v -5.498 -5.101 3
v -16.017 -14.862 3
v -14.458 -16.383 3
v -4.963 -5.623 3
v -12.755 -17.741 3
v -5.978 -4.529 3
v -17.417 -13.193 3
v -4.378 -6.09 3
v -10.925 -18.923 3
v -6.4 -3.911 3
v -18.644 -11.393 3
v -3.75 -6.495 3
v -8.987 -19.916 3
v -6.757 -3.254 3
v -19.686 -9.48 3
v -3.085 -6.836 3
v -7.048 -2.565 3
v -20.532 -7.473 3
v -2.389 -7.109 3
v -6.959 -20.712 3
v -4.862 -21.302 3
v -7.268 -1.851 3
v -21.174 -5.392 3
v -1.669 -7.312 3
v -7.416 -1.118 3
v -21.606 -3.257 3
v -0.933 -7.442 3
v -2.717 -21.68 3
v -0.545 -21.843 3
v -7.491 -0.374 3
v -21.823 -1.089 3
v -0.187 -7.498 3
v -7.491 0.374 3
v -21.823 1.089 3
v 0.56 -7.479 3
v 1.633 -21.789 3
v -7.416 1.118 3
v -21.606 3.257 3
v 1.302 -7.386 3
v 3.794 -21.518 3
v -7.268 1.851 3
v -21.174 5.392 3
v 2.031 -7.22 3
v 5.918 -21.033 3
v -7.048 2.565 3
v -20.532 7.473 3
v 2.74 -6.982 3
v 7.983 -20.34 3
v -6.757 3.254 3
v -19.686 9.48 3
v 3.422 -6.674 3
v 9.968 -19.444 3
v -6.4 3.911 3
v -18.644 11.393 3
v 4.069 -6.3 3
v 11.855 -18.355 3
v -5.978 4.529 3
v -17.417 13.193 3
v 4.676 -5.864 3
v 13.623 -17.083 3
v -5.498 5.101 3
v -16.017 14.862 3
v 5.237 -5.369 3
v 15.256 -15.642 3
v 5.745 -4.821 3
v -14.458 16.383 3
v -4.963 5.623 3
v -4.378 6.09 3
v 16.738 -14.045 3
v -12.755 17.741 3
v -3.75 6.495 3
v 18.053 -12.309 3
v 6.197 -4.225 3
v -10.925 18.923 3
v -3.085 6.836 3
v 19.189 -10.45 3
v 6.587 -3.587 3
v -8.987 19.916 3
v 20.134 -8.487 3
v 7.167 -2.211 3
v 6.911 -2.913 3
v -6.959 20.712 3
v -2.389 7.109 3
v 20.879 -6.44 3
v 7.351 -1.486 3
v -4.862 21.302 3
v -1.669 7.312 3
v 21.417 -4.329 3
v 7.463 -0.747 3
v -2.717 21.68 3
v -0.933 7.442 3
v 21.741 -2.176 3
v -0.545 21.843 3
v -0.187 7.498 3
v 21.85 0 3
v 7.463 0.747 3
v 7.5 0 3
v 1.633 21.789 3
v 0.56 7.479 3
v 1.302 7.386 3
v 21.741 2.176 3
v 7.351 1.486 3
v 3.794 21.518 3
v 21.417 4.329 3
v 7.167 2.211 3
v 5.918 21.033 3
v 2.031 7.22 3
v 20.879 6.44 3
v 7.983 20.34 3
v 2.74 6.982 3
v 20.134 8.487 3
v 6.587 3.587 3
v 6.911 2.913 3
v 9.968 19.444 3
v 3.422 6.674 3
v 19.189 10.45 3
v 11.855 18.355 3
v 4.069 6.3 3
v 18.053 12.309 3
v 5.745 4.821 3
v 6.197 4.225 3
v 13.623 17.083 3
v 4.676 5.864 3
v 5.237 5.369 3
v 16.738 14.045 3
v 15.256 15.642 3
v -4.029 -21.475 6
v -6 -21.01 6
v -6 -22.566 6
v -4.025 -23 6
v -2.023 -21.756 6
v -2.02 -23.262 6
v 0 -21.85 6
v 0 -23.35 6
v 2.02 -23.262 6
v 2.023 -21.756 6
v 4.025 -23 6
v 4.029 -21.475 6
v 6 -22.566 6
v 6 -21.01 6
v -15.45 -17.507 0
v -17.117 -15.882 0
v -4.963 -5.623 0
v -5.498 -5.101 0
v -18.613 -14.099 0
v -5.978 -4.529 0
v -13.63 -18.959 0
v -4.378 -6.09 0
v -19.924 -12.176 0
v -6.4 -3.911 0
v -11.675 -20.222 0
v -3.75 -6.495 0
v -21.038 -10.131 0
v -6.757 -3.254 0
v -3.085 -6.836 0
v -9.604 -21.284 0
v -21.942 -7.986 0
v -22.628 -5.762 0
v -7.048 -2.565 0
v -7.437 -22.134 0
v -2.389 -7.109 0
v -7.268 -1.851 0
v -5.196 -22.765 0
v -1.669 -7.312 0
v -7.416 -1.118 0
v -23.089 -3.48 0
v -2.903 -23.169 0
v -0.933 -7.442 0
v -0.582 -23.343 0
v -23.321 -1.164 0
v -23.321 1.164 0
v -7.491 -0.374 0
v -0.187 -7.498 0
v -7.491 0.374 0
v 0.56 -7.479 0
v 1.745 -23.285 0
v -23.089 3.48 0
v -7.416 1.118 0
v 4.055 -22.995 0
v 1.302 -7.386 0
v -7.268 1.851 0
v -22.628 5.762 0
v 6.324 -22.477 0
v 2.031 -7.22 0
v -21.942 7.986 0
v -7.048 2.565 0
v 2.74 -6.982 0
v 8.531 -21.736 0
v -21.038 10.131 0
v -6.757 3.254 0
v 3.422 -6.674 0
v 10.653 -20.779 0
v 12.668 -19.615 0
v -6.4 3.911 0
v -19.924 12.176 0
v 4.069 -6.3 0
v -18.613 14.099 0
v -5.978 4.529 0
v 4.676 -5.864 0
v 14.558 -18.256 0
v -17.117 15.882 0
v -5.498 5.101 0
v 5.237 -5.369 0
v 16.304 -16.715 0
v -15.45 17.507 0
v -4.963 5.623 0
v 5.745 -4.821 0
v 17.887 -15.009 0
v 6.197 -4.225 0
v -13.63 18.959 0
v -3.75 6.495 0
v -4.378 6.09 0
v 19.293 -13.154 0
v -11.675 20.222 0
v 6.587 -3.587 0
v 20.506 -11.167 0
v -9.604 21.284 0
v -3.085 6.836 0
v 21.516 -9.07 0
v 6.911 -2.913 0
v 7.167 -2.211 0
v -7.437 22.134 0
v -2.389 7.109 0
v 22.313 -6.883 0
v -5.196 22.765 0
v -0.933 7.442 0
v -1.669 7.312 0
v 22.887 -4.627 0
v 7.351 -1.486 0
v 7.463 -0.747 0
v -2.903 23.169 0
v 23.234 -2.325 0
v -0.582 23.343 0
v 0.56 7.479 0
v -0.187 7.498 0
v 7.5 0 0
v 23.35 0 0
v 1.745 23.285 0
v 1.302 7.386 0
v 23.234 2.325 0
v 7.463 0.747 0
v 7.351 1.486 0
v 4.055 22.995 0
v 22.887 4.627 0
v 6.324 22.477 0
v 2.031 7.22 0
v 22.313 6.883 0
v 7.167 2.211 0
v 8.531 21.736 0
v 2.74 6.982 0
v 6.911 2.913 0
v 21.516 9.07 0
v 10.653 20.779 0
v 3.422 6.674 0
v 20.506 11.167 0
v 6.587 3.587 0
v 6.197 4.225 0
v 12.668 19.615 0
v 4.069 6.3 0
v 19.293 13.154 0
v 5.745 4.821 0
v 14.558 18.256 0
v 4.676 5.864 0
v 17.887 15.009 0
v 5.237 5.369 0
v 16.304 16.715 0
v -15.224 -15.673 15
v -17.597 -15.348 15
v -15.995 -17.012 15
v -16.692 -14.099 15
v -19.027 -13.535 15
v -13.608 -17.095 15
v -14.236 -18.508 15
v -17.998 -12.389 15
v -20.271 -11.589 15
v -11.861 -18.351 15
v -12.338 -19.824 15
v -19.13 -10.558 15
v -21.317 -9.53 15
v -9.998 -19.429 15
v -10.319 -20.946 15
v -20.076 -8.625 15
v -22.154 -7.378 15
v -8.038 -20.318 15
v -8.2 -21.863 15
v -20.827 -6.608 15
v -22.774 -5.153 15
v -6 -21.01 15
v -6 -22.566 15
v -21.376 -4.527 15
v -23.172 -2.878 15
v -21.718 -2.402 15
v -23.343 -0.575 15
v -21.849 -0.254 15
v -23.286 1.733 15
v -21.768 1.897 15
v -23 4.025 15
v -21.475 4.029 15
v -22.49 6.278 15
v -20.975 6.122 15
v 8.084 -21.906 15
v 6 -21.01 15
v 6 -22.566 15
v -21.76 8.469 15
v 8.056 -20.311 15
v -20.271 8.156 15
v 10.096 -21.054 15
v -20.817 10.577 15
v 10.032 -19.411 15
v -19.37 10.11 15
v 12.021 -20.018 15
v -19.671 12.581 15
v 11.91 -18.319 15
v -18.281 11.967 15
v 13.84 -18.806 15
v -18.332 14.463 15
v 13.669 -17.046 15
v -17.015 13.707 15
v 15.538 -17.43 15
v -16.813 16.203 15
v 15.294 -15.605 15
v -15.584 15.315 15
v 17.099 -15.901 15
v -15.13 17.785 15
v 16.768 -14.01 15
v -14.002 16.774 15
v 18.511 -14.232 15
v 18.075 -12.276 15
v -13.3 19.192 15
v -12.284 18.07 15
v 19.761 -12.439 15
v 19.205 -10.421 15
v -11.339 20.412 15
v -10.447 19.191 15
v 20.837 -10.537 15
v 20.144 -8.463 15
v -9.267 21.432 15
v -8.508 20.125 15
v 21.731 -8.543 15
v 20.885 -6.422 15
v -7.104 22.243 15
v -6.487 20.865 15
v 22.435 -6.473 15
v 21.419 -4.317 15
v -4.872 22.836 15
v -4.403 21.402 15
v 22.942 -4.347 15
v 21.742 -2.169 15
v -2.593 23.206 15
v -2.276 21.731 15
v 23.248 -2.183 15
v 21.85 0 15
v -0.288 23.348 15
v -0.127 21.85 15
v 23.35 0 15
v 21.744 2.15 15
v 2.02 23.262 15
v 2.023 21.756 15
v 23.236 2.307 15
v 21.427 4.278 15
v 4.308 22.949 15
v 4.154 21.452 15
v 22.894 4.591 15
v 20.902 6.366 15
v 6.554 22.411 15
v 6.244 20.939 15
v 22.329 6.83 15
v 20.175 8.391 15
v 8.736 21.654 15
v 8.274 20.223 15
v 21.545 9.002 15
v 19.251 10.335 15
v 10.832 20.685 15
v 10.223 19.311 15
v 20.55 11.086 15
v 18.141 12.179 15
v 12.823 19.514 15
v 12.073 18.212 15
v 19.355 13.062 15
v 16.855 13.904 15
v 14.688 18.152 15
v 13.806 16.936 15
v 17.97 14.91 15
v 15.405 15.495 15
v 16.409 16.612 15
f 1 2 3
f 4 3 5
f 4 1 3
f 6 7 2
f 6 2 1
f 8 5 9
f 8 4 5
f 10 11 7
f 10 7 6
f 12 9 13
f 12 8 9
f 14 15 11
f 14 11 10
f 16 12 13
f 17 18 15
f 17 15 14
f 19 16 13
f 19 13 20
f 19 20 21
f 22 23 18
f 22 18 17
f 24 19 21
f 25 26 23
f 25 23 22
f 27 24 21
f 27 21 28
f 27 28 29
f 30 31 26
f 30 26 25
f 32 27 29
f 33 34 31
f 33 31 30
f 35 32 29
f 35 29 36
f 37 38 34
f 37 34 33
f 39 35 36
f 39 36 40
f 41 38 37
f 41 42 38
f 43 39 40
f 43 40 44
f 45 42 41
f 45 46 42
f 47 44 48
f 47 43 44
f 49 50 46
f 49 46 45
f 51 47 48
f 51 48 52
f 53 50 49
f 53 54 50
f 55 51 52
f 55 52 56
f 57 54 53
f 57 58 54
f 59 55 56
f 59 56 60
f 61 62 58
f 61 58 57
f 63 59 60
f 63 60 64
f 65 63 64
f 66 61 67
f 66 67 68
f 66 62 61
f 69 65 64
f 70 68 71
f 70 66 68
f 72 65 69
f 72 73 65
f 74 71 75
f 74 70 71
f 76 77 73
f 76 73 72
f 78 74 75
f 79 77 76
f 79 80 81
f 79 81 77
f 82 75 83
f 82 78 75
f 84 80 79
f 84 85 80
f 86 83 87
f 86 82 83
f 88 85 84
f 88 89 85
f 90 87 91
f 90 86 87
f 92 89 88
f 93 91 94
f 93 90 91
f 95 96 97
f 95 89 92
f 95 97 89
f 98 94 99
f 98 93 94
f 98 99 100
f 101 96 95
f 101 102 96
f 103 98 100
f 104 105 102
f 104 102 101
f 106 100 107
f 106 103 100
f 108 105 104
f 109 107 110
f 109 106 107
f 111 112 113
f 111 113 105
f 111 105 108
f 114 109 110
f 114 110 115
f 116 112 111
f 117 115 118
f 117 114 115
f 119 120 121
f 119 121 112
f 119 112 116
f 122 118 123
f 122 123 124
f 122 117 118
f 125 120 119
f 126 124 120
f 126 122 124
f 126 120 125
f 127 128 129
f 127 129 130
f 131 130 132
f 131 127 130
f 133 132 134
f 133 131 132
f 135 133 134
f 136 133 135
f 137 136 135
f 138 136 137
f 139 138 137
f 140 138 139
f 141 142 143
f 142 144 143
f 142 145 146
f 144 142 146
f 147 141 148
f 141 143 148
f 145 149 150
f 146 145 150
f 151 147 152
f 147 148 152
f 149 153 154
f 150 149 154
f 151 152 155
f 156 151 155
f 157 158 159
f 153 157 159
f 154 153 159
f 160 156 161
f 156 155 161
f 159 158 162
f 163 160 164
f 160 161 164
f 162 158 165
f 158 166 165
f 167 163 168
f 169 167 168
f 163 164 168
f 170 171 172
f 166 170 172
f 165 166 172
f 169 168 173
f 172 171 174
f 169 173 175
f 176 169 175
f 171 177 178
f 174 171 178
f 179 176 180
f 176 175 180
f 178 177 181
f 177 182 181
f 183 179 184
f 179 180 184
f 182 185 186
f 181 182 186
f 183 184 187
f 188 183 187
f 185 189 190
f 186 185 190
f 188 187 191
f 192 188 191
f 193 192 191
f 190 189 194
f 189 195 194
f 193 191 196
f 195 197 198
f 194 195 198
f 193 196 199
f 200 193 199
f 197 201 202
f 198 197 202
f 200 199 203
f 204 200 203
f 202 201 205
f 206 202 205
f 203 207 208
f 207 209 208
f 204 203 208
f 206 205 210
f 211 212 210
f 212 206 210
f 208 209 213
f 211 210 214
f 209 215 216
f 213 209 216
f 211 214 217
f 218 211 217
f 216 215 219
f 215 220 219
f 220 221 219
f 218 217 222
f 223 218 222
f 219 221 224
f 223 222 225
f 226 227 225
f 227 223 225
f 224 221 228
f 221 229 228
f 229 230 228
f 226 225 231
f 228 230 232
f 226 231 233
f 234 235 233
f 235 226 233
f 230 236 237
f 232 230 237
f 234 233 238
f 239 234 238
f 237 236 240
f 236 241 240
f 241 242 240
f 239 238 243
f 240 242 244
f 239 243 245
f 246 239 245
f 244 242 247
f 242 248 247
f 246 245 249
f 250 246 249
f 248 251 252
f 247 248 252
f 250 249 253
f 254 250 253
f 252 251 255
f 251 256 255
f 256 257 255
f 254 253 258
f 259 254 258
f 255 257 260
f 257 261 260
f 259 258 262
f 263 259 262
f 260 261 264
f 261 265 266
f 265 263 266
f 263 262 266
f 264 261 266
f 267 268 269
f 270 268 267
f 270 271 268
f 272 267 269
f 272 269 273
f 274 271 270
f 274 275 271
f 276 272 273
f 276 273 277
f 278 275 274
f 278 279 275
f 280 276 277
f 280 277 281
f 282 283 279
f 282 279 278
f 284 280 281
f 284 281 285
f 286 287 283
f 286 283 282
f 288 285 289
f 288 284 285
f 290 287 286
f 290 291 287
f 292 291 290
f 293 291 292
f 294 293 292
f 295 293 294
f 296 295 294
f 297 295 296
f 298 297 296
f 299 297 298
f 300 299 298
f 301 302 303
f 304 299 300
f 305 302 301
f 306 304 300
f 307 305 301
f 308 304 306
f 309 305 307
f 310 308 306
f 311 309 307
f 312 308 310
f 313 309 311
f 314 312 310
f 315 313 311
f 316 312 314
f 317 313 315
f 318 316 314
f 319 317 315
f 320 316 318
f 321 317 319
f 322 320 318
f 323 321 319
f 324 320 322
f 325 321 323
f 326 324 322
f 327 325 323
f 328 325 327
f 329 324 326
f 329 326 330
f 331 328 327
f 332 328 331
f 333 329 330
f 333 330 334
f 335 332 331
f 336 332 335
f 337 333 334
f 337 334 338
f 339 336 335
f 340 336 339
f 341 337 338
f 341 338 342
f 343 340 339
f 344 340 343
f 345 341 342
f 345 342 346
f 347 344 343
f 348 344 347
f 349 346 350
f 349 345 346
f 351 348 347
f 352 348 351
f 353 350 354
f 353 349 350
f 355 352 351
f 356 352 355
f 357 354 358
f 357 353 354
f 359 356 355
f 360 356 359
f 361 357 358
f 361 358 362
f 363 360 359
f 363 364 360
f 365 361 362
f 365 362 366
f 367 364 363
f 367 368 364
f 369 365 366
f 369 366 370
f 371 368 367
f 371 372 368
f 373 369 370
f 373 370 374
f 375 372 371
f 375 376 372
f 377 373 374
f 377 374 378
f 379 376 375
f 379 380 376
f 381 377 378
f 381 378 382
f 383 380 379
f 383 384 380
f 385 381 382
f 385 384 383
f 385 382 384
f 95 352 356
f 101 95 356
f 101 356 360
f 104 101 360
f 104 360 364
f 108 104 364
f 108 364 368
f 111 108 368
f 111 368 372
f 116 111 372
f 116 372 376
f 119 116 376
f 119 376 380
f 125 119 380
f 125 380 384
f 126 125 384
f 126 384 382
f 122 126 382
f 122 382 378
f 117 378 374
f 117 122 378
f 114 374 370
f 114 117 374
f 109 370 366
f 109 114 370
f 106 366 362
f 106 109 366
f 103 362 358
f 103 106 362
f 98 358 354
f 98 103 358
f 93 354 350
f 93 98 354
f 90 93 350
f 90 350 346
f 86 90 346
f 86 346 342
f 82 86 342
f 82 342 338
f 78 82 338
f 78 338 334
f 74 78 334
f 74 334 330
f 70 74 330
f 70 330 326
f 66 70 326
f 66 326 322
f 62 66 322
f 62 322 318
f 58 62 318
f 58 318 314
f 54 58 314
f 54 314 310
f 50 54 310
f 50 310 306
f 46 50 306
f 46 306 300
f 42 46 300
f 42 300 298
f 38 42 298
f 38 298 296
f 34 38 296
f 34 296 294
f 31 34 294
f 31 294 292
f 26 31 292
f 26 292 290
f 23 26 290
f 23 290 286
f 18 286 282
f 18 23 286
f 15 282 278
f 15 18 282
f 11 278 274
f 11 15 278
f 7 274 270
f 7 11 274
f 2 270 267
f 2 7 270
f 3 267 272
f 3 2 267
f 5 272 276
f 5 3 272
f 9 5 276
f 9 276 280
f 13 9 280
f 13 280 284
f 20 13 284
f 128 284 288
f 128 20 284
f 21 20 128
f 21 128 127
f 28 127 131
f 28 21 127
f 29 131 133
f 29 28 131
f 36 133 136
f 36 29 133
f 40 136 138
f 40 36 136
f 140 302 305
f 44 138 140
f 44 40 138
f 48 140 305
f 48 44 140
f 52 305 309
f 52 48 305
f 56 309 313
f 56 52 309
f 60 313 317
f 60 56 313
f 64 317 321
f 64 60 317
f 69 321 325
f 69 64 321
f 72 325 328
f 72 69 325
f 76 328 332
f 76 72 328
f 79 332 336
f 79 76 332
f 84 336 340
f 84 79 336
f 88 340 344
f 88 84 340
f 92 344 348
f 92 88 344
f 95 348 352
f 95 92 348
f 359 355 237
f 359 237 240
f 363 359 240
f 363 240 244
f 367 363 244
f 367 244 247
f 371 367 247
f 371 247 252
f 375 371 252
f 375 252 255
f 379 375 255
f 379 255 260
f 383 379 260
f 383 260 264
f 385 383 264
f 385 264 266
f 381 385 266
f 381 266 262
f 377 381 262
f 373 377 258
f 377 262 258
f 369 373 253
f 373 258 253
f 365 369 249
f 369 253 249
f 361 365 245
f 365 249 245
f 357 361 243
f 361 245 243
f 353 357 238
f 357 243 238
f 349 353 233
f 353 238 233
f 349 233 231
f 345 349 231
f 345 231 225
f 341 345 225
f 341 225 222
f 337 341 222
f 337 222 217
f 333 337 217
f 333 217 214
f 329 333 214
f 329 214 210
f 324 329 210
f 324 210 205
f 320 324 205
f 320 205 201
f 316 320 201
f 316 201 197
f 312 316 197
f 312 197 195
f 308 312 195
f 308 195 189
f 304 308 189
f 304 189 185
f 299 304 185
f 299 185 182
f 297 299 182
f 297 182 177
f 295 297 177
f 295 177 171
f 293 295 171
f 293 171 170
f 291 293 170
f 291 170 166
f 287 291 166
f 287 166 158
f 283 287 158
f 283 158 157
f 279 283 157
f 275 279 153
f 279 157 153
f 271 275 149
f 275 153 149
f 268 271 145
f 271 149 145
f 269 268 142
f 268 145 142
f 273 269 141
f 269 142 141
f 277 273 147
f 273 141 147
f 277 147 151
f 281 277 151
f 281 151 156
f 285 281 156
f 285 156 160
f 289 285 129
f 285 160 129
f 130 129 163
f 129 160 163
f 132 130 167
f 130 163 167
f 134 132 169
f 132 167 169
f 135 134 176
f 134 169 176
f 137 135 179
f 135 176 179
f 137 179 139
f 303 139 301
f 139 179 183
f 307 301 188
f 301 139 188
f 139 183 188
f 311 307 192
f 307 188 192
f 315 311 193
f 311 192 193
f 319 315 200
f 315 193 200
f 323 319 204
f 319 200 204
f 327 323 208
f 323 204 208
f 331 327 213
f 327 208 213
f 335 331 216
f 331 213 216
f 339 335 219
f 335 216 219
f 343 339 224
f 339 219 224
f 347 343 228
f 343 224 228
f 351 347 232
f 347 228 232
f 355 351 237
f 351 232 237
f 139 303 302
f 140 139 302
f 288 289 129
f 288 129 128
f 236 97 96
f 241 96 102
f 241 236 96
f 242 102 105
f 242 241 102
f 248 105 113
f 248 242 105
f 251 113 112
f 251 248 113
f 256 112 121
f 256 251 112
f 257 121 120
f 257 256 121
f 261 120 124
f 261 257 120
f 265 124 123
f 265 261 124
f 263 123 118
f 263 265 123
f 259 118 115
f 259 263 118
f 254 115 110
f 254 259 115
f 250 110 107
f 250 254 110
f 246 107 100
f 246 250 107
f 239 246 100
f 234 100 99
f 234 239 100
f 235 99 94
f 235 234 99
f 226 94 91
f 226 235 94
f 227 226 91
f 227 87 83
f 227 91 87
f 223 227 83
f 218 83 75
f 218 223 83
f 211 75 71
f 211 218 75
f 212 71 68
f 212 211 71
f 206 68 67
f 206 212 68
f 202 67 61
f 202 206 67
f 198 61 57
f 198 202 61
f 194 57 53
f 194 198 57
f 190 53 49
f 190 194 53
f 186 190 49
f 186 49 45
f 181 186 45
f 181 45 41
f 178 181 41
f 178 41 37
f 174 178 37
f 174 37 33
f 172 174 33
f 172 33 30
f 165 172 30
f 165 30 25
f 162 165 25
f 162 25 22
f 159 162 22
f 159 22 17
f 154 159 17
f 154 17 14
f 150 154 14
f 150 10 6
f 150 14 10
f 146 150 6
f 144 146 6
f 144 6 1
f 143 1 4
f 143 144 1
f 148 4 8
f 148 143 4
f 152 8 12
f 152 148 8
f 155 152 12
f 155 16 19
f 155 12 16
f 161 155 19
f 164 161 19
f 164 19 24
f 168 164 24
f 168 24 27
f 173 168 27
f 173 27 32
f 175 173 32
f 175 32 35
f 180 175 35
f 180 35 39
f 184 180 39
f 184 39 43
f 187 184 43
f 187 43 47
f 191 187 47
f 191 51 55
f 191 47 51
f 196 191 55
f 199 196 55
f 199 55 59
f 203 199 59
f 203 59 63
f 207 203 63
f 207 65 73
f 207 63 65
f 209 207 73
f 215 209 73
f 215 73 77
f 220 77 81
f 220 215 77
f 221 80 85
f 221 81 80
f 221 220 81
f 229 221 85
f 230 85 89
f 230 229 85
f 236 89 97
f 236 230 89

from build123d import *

# Parameters (mm, degrees)
F0_R     = 23.35
F0_R_2   = 21.85
F1_DEPTH = 15
F2_DEPTH = 3
F3_R     = 7.5
F4_DEPTH = 25.4
F6_W     = 12
F6_H     = 6.807694
F7_DEPTH = 9


with BuildPart() as f1:
    # F0 (on Top) → F1 (new body)
    with BuildSketch(Plane.XY):
        Circle(F0_R)
        Circle(F0_R_2, mode=Mode.SUBTRACT)
    extrude(amount=F1_DEPTH)

    # F0 (on Top) → F2 (join)
    with BuildSketch(Plane.XY):
        Circle(F0_R_2)
    extrude(amount=F2_DEPTH)

    # F3 (on Top) → F4 (cut)
    with BuildSketch(Plane.XY):
        Circle(F3_R)
    extrude(amount=F4_DEPTH, mode=Mode.SUBTRACT)

    # F6 (on offset) → F7 (cut)
    with BuildSketch(Plane.XY.offset(15)):
        with Locations((0, -22.193914)):
            Rectangle(F6_W, F6_H)
    extrude(amount=-F7_DEPTH, mode=Mode.SUBTRACT)


solid = f1.part
